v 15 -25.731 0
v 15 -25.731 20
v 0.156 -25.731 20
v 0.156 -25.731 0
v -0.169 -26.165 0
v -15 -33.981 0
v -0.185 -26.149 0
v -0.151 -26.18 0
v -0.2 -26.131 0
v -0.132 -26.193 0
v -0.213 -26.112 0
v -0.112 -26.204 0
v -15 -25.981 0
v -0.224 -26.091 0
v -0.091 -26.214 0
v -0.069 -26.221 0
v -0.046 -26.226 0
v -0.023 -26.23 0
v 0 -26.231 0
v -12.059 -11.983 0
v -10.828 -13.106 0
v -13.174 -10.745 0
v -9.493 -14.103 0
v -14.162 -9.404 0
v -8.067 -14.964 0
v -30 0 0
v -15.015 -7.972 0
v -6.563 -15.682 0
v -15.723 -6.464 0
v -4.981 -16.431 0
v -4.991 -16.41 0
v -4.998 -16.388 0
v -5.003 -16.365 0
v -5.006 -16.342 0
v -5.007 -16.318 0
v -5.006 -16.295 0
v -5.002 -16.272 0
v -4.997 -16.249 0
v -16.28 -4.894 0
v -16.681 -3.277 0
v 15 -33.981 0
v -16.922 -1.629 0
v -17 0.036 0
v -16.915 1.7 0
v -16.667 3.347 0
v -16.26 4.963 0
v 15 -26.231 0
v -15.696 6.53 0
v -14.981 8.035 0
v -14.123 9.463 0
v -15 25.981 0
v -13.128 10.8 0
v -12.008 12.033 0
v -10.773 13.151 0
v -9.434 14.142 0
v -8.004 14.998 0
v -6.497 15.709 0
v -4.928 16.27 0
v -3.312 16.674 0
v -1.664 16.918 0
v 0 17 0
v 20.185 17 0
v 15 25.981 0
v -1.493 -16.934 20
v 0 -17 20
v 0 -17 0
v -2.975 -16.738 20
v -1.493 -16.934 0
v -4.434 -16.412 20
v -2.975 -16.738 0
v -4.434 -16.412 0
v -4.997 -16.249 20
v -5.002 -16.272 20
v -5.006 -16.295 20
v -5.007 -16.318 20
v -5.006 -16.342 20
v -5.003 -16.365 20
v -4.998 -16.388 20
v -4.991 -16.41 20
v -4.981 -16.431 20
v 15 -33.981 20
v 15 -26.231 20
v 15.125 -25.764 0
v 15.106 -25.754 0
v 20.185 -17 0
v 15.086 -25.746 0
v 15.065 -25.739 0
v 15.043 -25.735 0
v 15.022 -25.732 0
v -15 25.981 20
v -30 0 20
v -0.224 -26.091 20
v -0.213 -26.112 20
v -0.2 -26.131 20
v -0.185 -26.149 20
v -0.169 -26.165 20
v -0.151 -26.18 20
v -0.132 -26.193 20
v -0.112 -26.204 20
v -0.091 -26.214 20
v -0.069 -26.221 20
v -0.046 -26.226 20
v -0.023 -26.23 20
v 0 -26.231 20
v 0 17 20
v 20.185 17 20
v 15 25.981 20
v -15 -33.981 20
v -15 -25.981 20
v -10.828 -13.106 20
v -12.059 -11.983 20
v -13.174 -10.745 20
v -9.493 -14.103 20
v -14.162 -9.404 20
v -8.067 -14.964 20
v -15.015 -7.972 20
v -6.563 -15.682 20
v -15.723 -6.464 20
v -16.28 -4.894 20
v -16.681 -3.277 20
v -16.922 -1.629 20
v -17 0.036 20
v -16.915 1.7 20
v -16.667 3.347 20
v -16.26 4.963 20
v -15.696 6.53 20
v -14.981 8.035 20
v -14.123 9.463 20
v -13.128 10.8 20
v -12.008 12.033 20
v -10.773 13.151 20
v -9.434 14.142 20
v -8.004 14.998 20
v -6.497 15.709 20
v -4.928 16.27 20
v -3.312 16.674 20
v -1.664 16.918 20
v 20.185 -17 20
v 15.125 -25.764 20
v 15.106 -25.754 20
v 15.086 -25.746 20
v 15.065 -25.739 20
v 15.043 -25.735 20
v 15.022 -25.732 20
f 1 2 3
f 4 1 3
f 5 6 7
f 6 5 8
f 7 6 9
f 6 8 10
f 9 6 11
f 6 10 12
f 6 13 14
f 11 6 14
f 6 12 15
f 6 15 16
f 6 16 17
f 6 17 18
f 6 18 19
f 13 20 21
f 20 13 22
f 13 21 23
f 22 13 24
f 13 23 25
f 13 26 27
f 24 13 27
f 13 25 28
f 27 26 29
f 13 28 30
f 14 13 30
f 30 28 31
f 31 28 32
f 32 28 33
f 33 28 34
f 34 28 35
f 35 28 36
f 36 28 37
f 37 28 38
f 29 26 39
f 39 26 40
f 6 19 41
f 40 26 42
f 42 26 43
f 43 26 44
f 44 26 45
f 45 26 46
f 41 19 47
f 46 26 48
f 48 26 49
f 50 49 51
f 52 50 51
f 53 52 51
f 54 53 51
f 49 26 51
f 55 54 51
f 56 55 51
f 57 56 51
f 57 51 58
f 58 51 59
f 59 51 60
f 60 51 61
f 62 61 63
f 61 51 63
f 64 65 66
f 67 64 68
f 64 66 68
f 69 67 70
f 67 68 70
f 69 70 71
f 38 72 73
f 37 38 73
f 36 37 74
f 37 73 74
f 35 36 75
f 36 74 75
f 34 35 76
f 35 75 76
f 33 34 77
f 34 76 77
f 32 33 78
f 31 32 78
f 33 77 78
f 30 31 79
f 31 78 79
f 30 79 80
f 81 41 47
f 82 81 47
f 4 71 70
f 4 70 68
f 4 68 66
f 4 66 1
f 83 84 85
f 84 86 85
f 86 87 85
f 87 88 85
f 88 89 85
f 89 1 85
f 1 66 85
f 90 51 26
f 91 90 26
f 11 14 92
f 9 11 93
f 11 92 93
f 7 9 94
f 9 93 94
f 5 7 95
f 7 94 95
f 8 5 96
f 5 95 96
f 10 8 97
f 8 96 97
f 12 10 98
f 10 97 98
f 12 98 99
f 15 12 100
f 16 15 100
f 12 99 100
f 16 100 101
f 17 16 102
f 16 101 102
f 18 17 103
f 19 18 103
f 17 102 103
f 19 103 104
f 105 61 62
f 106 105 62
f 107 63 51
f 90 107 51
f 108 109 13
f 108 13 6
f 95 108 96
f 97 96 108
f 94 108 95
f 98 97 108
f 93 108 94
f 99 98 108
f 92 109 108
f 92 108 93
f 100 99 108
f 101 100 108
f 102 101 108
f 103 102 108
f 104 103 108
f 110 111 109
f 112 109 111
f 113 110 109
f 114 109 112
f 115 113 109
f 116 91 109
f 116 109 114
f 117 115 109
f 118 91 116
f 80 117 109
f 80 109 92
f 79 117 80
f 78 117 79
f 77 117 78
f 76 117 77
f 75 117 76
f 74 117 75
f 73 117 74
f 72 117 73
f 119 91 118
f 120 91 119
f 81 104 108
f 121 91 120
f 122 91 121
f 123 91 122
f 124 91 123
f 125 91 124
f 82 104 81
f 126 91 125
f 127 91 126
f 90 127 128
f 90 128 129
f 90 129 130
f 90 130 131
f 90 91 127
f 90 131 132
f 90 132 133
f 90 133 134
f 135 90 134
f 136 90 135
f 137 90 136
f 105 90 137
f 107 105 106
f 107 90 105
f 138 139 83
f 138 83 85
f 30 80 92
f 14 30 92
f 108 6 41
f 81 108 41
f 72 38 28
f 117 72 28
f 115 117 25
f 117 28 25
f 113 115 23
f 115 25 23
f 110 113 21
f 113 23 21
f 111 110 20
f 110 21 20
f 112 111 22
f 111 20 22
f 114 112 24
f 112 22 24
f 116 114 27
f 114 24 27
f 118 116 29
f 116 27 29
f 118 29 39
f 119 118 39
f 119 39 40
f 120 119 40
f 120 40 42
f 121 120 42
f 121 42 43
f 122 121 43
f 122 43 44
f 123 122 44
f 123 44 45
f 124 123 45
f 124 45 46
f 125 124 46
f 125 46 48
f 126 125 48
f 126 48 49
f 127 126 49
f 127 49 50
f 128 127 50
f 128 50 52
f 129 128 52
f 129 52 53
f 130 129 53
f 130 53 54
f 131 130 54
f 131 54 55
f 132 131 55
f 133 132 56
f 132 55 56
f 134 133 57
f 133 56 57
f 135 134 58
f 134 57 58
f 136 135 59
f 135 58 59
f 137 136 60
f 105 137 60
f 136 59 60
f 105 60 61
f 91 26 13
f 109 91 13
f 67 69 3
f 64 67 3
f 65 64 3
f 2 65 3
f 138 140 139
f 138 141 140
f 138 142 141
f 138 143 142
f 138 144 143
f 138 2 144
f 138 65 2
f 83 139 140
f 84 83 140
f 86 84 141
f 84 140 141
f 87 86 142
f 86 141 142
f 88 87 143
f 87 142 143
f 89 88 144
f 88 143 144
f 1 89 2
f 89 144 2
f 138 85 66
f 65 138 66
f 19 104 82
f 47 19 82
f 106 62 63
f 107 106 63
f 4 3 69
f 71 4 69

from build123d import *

# Parameters (mm, degrees)
F1_DEPTH = 20
F3_DEPTH = 25


with BuildPart() as f1:
    # F0 (on Top) → F1 (new body)
    with BuildSketch(Plane.XY):
        with BuildLine():
            Line((15, 25.9807621135), (-15, 25.9807621135))
            Line((-15, 25.9807621135), (-30, 0))
            Line((-30, 0), (-15, -25.9807621135))
            Line((-15, -25.9807621135), (-15, -33.9807621135))
            Line((-15, -33.9807621135), (15, -33.9807621135))
            Line((15, -33.9807621135), (15, -25.9807621135))
            Line((15, -25.9807621135), (20.1850454238, -17))
            Line((20.1850454238, -17), (0, -17))
            ThreePointArc((0, -17), (-17, 0), (0, 17))
            Line((0, 17), (20.1850454238, 17))
            Line((20.1850454238, 17), (15, 25.9807621135))
        make_face()
    extrude(amount=F1_DEPTH)

    # F2 (on face) → F3 (cut)
    with BuildSketch(Plane.XY.offset(20)):
        with BuildLine():
            ThreePointArc((0, -26.2307621135), (0.1767766953, -26.1575388088), (0.25, -25.9807621135))
            Line((0.25, -25.9807621135), (0, -25.9807621135))
            Line((0, -25.9807621135), (-0.1104495459, -25.756483497))
            ThreePointArc((-0.1104495459, -25.756483497), (-0.2366885535, -25.9002728058), (-0.2242786165, -26.0912116594))
            ThreePointArc((-0.2242786165, -26.0912116594), (-0.1320750043, -26.1930265553), (0, -26.2307621135))
        make_face()
        with BuildLine():
            Line((0, -25.9807621135), (0.25, -25.9807621135))
            ThreePointArc((0.25, -25.9807621135), (0.2434847574, -25.9240596185), (0.2242786165, -25.8703125677))
            Line((0.2242786165, -25.8703125677), (0.155554792, -25.7307621135))
            Line((0.155554792, -25.7307621135), (0, -25.7307621135))
            ThreePointArc((0, -25.7307621135), (-0.056702495, -25.7372773562), (-0.1104495459, -25.756483497))
            Line((-0.1104495459, -25.756483497), (0, -25.9807621135))
        make_face()
        with BuildLine():
            ThreePointArc((0.2242786165, -25.8703125677), (0.2434847574, -25.9240596185), (0.25, -25.9807621135))
            ThreePointArc((0.25, -25.9807621135), (0.1767766953, -26.1575388088), (0, -26.2307621135))
            Line((0, -26.2307621135), (15, -26.2307621135))
            ThreePointArc((15, -26.2307621135), (15.25, -25.9807621135), (15, -25.7307621135))
            Line((15, -25.7307621135), (0.155554792, -25.7307621135))
            Line((0.155554792, -25.7307621135), (0.2242786165, -25.8703125677))
        make_face()
        with BuildLine():
            ThreePointArc((-0.2242786165, -26.0912116594), (-0.2366885535, -25.9002728058), (-0.1104495459, -25.756483497))
            ThreePointArc((-0.1104495459, -25.756483497), (-0.056702495, -25.7372773562), (0, -25.7307621135))
            Line((0, -25.7307621135), (0.155554792, -25.7307621135))
            Line((0.155554792, -25.7307621135), (-4.5329129602, -16.2103693154))
            ThreePointArc((-4.5329129602, -16.2103693154), (-4.8676411226, -16.0965402448), (-4.9814701932, -16.4312684071))
            Line((-4.9814701932, -16.4312684071), (-0.2242786165, -26.0912116594))
        make_face()
    extrude(amount=-F3_DEPTH, mode=Mode.SUBTRACT)


solid = f1.part
